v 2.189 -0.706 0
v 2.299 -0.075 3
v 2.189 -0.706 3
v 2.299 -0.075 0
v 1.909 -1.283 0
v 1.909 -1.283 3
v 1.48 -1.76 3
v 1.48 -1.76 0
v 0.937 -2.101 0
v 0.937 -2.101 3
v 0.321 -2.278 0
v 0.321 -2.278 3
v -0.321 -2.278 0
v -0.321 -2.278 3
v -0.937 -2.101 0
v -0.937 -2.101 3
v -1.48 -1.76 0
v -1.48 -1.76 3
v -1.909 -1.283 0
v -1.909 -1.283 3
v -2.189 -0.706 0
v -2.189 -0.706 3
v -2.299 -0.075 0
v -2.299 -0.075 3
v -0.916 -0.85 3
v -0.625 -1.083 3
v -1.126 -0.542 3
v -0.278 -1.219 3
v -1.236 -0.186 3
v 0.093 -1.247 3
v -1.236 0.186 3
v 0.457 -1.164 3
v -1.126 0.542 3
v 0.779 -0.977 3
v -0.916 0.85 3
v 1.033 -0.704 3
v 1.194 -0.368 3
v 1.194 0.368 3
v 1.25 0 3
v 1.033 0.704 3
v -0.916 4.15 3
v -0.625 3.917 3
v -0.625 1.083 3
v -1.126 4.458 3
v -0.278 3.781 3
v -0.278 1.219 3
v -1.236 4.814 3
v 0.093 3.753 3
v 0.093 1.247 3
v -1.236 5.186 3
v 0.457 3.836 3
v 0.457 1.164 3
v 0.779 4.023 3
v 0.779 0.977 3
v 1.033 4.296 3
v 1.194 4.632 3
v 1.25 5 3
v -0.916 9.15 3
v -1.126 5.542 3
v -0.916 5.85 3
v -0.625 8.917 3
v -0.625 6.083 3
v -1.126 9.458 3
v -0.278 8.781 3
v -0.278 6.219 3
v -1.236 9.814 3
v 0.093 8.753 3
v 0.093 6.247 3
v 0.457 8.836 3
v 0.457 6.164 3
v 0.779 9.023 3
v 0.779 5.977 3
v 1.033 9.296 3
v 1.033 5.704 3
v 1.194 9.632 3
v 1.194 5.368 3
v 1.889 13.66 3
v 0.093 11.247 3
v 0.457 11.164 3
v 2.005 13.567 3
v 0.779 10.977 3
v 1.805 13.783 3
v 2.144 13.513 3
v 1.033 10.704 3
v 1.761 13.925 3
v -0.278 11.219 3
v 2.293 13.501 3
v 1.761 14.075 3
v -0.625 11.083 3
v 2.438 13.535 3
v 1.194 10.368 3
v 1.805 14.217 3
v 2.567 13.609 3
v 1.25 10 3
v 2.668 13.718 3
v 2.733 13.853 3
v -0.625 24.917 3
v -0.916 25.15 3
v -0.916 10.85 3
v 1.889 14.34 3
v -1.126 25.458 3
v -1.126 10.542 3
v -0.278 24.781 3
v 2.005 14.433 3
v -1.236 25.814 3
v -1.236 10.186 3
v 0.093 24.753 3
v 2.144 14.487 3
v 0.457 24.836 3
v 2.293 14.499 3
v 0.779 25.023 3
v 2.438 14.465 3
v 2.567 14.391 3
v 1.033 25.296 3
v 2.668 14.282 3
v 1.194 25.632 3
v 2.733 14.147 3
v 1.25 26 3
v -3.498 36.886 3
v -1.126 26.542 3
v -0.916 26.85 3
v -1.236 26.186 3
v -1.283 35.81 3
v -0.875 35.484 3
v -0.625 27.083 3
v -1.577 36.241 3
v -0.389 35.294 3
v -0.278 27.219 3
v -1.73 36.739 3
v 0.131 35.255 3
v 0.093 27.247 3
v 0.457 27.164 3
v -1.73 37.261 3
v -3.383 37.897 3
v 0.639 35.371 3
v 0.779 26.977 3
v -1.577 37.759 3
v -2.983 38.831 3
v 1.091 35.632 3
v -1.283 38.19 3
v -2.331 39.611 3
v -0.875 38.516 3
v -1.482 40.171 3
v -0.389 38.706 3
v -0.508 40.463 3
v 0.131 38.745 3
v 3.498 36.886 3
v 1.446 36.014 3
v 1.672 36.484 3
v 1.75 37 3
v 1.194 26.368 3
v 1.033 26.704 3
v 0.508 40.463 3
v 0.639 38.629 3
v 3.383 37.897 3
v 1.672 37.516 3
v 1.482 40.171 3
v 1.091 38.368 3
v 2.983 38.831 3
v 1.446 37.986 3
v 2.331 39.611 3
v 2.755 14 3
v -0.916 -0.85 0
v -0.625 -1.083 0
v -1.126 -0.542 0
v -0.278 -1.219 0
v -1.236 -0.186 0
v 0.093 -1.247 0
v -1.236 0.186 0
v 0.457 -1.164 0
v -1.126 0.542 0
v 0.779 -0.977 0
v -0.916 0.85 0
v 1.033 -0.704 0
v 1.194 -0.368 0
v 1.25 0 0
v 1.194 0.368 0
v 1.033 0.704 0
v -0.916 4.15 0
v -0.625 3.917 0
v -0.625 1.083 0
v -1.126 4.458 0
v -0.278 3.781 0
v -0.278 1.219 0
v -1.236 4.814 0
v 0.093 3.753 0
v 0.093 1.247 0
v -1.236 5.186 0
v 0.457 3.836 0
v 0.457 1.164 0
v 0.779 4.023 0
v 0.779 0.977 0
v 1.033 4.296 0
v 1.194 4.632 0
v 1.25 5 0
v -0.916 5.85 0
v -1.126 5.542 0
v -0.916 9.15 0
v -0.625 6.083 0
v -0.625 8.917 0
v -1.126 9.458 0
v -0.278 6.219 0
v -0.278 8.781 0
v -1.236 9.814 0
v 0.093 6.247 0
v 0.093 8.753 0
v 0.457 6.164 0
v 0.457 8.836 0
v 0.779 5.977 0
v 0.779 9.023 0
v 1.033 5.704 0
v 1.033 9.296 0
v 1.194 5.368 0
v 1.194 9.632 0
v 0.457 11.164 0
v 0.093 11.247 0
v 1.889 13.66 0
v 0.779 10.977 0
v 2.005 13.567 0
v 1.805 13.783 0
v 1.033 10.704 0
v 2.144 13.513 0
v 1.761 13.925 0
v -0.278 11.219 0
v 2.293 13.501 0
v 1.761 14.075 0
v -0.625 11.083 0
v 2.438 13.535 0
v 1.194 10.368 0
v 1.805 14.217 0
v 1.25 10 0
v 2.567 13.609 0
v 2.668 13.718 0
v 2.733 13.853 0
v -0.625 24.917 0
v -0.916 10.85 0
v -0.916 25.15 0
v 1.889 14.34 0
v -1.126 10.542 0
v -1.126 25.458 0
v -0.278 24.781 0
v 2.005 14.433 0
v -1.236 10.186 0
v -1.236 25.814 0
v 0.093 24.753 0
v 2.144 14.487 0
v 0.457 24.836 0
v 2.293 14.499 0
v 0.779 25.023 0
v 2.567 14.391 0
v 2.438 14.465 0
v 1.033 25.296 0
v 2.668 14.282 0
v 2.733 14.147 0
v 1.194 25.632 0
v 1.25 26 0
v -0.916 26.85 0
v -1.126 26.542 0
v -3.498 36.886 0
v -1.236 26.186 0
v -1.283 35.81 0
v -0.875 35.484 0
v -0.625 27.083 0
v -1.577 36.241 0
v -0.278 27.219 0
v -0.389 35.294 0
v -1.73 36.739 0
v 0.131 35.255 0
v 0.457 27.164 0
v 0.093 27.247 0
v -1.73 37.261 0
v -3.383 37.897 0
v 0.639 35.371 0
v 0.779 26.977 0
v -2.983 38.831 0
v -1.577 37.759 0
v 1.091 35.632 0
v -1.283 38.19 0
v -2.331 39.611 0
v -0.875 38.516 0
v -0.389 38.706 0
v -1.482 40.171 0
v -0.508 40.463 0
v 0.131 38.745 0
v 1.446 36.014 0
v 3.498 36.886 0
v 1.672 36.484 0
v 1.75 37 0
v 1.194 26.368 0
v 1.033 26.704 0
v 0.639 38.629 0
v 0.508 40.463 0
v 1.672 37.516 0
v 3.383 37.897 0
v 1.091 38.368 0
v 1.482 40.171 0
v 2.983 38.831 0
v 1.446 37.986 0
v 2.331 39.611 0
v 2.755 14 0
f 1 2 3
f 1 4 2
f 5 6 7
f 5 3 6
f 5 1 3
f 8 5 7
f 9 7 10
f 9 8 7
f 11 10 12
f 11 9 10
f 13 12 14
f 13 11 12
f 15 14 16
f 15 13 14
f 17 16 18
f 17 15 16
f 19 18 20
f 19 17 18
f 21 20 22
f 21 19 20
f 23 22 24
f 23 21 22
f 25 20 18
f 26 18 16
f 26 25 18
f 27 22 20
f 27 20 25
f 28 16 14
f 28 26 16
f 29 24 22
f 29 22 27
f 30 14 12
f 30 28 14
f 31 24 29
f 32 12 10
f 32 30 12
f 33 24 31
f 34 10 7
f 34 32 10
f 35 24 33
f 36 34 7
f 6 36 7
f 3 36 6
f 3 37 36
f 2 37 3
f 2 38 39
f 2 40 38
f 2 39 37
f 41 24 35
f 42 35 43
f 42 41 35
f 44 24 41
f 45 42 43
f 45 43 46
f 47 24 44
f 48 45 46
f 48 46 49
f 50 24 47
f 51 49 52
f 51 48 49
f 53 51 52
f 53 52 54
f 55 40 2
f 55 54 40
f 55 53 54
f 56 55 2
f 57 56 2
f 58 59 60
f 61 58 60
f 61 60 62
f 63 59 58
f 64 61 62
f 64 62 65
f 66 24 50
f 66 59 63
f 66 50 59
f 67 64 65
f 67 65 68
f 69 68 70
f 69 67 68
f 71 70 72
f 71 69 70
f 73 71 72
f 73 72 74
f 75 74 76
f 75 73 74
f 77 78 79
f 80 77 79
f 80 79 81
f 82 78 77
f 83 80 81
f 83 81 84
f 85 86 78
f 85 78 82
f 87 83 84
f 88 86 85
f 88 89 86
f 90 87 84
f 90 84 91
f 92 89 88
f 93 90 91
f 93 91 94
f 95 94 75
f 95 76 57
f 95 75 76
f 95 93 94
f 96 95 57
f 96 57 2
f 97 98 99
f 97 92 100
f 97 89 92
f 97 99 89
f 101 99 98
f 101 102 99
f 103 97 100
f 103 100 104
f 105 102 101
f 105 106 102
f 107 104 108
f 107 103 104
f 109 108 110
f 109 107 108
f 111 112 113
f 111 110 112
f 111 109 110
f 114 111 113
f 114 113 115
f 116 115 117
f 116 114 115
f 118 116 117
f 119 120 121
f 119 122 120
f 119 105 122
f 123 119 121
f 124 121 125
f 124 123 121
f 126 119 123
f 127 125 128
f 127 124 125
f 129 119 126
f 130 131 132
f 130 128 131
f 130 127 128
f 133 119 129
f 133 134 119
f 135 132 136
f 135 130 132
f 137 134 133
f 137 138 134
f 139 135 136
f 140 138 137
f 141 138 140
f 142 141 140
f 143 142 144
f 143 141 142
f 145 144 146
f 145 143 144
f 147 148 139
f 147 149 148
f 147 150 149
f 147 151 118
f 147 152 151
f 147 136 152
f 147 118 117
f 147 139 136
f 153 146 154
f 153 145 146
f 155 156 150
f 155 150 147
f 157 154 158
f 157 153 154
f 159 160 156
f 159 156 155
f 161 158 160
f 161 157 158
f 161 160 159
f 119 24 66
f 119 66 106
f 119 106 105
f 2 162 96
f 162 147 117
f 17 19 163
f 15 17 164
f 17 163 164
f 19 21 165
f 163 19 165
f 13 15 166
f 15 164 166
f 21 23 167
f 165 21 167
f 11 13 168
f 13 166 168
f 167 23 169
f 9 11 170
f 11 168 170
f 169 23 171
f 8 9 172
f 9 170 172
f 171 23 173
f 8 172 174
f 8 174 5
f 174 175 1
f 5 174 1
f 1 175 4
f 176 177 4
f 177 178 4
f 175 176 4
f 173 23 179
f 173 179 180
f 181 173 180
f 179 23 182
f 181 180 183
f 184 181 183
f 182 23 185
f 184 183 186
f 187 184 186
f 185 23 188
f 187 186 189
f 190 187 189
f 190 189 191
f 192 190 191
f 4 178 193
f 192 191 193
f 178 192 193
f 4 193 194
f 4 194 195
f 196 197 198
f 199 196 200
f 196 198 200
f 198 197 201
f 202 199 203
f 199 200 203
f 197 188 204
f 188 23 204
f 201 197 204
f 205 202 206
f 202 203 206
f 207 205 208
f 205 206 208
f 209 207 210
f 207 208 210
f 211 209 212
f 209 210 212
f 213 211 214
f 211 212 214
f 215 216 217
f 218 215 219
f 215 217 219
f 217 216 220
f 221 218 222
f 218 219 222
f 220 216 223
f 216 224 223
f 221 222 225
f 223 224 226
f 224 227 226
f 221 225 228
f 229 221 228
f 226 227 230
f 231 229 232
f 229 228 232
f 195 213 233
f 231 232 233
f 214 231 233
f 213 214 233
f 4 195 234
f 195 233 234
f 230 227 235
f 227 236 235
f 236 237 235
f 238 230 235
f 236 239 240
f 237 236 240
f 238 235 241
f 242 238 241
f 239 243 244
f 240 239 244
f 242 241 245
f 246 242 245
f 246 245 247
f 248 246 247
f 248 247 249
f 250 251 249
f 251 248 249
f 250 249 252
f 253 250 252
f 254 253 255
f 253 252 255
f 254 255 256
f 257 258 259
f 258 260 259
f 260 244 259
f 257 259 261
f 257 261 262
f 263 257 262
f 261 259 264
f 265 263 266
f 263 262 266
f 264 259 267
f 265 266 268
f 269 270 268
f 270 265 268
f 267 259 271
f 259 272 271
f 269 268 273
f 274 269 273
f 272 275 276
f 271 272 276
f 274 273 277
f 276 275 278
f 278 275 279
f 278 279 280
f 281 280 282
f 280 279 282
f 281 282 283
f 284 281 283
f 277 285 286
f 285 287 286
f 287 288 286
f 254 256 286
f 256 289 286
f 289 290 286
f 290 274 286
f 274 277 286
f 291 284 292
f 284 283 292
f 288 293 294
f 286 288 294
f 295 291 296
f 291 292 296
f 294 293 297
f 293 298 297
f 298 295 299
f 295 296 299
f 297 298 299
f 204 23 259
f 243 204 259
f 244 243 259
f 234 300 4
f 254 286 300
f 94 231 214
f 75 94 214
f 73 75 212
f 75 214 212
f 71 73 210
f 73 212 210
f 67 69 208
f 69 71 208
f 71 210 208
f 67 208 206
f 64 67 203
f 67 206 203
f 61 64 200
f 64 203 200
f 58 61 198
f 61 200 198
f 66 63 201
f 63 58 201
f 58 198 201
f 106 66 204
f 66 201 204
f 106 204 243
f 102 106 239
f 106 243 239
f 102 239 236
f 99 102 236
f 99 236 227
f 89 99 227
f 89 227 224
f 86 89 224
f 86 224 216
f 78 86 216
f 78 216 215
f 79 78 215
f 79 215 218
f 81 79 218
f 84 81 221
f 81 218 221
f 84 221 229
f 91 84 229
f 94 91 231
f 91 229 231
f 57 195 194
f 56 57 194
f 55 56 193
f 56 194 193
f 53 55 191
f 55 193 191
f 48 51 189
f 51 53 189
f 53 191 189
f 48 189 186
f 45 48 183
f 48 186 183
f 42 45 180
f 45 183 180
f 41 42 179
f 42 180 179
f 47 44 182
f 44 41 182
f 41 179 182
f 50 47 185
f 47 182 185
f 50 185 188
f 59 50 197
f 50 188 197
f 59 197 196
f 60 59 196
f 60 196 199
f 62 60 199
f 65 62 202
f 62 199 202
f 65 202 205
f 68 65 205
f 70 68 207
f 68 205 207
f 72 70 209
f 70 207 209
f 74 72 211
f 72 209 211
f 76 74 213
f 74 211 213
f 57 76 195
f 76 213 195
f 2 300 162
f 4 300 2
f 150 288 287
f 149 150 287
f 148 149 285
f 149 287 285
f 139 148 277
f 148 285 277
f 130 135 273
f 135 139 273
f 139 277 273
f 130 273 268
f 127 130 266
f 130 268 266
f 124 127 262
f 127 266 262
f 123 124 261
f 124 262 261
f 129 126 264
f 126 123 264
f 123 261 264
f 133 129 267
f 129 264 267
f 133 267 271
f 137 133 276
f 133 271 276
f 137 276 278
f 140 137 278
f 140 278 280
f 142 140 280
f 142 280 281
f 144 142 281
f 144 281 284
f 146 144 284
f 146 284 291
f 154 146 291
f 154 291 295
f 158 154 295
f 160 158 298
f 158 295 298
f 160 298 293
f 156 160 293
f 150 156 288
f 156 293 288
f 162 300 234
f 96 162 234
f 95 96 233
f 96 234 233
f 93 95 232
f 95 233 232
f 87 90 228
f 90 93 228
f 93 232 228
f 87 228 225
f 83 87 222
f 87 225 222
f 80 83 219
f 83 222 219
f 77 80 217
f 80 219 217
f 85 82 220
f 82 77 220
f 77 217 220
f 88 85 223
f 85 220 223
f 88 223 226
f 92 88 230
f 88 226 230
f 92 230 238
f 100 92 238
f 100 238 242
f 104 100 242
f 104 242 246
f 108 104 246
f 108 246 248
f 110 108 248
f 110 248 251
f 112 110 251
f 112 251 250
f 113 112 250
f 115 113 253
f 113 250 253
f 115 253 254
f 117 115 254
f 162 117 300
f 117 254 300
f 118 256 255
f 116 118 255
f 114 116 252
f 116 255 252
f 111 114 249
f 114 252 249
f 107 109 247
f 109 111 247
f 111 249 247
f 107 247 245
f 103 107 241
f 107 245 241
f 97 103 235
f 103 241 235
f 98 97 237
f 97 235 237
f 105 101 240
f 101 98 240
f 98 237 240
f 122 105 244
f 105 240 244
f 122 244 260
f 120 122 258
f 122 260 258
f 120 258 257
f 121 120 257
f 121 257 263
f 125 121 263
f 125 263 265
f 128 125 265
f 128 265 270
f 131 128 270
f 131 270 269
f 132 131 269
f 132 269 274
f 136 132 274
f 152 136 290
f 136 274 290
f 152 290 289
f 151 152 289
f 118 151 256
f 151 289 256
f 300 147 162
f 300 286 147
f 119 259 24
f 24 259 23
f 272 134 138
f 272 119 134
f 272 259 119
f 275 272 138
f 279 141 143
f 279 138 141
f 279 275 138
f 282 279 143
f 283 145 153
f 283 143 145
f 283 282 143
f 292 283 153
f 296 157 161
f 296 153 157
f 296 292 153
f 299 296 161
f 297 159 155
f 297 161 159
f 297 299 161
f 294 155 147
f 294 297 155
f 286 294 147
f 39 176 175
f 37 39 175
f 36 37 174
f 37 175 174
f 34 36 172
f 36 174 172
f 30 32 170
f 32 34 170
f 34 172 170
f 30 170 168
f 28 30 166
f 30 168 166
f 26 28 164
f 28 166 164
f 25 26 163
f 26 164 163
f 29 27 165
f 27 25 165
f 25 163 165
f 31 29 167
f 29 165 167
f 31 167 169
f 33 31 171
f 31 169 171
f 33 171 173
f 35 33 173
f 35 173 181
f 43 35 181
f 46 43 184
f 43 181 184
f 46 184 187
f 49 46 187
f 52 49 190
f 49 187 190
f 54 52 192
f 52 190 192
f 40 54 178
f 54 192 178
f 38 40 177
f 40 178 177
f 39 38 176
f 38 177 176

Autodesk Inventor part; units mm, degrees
ref_plane "YZ Plane" through (0, 0, 0) normal (1, 0, 0) x (0, 1, 0)
ref_plane "XZ Plane" through (0, 0, 0) normal (0, 1, 0) x (-1, 0, 0)
ref_plane "XY Plane" through (0, 0, 0) normal (0, 0, 1) x (1, 0, 0)
sketch "Boceto1" plane through (0, 0, 0) normal (0, 0, 1) x (1, 0, 0)
  circle A0 centre (0, 0) radius 1.25
  arc A1 (-2.2988, -0.0746) -> (2.2988, -0.0746) centre (0, 0) ccw
  arc A2 (3.4982, 36.8865) -> (-3.4982, 36.8865) centre (0, 37) ccw
  circle A3 centre (0, 37) radius 1.75
  line L0 (0, 0) -> (0, 37) construction
  line L1 (-3.4982, 36.8865) -> (-2.2988, -0.0746)
  line L2 (3.4982, 36.8865) -> (2.2988, -0.0746)
  circle A4 centre (0, 5) radius 1.25
  circle A5 centre (0, 10) radius 1.25
  circle A6 centre (0, 26) radius 1.25
  circle A7 centre (2.2552, 14) radius 0.5
  point P0 (2.755, 13.9838)
  dimension "d0" = 37
  dimension "d1" = 7
  dimension "d2" = 3.5
  dimension "d3" = 4.6
  dimension "d4" = 2.5
  dimension "d5" = 2.5
  dimension "d6" = 2.5
  dimension "d7" = 2.5
  dimension "d8" = 5
  dimension "d9" = 5
  dimension "d10" = 4
  dimension "d11" = 1
  dimension "d12" = 12
extrude "Extrusión1" add sketch "Boceto1" along normal blind 3
equation "\"d5\" = d4"
equation "\"d6\" = d4"
equation "\"d7\" = d4"
properties part number "Hudson 1-65"
